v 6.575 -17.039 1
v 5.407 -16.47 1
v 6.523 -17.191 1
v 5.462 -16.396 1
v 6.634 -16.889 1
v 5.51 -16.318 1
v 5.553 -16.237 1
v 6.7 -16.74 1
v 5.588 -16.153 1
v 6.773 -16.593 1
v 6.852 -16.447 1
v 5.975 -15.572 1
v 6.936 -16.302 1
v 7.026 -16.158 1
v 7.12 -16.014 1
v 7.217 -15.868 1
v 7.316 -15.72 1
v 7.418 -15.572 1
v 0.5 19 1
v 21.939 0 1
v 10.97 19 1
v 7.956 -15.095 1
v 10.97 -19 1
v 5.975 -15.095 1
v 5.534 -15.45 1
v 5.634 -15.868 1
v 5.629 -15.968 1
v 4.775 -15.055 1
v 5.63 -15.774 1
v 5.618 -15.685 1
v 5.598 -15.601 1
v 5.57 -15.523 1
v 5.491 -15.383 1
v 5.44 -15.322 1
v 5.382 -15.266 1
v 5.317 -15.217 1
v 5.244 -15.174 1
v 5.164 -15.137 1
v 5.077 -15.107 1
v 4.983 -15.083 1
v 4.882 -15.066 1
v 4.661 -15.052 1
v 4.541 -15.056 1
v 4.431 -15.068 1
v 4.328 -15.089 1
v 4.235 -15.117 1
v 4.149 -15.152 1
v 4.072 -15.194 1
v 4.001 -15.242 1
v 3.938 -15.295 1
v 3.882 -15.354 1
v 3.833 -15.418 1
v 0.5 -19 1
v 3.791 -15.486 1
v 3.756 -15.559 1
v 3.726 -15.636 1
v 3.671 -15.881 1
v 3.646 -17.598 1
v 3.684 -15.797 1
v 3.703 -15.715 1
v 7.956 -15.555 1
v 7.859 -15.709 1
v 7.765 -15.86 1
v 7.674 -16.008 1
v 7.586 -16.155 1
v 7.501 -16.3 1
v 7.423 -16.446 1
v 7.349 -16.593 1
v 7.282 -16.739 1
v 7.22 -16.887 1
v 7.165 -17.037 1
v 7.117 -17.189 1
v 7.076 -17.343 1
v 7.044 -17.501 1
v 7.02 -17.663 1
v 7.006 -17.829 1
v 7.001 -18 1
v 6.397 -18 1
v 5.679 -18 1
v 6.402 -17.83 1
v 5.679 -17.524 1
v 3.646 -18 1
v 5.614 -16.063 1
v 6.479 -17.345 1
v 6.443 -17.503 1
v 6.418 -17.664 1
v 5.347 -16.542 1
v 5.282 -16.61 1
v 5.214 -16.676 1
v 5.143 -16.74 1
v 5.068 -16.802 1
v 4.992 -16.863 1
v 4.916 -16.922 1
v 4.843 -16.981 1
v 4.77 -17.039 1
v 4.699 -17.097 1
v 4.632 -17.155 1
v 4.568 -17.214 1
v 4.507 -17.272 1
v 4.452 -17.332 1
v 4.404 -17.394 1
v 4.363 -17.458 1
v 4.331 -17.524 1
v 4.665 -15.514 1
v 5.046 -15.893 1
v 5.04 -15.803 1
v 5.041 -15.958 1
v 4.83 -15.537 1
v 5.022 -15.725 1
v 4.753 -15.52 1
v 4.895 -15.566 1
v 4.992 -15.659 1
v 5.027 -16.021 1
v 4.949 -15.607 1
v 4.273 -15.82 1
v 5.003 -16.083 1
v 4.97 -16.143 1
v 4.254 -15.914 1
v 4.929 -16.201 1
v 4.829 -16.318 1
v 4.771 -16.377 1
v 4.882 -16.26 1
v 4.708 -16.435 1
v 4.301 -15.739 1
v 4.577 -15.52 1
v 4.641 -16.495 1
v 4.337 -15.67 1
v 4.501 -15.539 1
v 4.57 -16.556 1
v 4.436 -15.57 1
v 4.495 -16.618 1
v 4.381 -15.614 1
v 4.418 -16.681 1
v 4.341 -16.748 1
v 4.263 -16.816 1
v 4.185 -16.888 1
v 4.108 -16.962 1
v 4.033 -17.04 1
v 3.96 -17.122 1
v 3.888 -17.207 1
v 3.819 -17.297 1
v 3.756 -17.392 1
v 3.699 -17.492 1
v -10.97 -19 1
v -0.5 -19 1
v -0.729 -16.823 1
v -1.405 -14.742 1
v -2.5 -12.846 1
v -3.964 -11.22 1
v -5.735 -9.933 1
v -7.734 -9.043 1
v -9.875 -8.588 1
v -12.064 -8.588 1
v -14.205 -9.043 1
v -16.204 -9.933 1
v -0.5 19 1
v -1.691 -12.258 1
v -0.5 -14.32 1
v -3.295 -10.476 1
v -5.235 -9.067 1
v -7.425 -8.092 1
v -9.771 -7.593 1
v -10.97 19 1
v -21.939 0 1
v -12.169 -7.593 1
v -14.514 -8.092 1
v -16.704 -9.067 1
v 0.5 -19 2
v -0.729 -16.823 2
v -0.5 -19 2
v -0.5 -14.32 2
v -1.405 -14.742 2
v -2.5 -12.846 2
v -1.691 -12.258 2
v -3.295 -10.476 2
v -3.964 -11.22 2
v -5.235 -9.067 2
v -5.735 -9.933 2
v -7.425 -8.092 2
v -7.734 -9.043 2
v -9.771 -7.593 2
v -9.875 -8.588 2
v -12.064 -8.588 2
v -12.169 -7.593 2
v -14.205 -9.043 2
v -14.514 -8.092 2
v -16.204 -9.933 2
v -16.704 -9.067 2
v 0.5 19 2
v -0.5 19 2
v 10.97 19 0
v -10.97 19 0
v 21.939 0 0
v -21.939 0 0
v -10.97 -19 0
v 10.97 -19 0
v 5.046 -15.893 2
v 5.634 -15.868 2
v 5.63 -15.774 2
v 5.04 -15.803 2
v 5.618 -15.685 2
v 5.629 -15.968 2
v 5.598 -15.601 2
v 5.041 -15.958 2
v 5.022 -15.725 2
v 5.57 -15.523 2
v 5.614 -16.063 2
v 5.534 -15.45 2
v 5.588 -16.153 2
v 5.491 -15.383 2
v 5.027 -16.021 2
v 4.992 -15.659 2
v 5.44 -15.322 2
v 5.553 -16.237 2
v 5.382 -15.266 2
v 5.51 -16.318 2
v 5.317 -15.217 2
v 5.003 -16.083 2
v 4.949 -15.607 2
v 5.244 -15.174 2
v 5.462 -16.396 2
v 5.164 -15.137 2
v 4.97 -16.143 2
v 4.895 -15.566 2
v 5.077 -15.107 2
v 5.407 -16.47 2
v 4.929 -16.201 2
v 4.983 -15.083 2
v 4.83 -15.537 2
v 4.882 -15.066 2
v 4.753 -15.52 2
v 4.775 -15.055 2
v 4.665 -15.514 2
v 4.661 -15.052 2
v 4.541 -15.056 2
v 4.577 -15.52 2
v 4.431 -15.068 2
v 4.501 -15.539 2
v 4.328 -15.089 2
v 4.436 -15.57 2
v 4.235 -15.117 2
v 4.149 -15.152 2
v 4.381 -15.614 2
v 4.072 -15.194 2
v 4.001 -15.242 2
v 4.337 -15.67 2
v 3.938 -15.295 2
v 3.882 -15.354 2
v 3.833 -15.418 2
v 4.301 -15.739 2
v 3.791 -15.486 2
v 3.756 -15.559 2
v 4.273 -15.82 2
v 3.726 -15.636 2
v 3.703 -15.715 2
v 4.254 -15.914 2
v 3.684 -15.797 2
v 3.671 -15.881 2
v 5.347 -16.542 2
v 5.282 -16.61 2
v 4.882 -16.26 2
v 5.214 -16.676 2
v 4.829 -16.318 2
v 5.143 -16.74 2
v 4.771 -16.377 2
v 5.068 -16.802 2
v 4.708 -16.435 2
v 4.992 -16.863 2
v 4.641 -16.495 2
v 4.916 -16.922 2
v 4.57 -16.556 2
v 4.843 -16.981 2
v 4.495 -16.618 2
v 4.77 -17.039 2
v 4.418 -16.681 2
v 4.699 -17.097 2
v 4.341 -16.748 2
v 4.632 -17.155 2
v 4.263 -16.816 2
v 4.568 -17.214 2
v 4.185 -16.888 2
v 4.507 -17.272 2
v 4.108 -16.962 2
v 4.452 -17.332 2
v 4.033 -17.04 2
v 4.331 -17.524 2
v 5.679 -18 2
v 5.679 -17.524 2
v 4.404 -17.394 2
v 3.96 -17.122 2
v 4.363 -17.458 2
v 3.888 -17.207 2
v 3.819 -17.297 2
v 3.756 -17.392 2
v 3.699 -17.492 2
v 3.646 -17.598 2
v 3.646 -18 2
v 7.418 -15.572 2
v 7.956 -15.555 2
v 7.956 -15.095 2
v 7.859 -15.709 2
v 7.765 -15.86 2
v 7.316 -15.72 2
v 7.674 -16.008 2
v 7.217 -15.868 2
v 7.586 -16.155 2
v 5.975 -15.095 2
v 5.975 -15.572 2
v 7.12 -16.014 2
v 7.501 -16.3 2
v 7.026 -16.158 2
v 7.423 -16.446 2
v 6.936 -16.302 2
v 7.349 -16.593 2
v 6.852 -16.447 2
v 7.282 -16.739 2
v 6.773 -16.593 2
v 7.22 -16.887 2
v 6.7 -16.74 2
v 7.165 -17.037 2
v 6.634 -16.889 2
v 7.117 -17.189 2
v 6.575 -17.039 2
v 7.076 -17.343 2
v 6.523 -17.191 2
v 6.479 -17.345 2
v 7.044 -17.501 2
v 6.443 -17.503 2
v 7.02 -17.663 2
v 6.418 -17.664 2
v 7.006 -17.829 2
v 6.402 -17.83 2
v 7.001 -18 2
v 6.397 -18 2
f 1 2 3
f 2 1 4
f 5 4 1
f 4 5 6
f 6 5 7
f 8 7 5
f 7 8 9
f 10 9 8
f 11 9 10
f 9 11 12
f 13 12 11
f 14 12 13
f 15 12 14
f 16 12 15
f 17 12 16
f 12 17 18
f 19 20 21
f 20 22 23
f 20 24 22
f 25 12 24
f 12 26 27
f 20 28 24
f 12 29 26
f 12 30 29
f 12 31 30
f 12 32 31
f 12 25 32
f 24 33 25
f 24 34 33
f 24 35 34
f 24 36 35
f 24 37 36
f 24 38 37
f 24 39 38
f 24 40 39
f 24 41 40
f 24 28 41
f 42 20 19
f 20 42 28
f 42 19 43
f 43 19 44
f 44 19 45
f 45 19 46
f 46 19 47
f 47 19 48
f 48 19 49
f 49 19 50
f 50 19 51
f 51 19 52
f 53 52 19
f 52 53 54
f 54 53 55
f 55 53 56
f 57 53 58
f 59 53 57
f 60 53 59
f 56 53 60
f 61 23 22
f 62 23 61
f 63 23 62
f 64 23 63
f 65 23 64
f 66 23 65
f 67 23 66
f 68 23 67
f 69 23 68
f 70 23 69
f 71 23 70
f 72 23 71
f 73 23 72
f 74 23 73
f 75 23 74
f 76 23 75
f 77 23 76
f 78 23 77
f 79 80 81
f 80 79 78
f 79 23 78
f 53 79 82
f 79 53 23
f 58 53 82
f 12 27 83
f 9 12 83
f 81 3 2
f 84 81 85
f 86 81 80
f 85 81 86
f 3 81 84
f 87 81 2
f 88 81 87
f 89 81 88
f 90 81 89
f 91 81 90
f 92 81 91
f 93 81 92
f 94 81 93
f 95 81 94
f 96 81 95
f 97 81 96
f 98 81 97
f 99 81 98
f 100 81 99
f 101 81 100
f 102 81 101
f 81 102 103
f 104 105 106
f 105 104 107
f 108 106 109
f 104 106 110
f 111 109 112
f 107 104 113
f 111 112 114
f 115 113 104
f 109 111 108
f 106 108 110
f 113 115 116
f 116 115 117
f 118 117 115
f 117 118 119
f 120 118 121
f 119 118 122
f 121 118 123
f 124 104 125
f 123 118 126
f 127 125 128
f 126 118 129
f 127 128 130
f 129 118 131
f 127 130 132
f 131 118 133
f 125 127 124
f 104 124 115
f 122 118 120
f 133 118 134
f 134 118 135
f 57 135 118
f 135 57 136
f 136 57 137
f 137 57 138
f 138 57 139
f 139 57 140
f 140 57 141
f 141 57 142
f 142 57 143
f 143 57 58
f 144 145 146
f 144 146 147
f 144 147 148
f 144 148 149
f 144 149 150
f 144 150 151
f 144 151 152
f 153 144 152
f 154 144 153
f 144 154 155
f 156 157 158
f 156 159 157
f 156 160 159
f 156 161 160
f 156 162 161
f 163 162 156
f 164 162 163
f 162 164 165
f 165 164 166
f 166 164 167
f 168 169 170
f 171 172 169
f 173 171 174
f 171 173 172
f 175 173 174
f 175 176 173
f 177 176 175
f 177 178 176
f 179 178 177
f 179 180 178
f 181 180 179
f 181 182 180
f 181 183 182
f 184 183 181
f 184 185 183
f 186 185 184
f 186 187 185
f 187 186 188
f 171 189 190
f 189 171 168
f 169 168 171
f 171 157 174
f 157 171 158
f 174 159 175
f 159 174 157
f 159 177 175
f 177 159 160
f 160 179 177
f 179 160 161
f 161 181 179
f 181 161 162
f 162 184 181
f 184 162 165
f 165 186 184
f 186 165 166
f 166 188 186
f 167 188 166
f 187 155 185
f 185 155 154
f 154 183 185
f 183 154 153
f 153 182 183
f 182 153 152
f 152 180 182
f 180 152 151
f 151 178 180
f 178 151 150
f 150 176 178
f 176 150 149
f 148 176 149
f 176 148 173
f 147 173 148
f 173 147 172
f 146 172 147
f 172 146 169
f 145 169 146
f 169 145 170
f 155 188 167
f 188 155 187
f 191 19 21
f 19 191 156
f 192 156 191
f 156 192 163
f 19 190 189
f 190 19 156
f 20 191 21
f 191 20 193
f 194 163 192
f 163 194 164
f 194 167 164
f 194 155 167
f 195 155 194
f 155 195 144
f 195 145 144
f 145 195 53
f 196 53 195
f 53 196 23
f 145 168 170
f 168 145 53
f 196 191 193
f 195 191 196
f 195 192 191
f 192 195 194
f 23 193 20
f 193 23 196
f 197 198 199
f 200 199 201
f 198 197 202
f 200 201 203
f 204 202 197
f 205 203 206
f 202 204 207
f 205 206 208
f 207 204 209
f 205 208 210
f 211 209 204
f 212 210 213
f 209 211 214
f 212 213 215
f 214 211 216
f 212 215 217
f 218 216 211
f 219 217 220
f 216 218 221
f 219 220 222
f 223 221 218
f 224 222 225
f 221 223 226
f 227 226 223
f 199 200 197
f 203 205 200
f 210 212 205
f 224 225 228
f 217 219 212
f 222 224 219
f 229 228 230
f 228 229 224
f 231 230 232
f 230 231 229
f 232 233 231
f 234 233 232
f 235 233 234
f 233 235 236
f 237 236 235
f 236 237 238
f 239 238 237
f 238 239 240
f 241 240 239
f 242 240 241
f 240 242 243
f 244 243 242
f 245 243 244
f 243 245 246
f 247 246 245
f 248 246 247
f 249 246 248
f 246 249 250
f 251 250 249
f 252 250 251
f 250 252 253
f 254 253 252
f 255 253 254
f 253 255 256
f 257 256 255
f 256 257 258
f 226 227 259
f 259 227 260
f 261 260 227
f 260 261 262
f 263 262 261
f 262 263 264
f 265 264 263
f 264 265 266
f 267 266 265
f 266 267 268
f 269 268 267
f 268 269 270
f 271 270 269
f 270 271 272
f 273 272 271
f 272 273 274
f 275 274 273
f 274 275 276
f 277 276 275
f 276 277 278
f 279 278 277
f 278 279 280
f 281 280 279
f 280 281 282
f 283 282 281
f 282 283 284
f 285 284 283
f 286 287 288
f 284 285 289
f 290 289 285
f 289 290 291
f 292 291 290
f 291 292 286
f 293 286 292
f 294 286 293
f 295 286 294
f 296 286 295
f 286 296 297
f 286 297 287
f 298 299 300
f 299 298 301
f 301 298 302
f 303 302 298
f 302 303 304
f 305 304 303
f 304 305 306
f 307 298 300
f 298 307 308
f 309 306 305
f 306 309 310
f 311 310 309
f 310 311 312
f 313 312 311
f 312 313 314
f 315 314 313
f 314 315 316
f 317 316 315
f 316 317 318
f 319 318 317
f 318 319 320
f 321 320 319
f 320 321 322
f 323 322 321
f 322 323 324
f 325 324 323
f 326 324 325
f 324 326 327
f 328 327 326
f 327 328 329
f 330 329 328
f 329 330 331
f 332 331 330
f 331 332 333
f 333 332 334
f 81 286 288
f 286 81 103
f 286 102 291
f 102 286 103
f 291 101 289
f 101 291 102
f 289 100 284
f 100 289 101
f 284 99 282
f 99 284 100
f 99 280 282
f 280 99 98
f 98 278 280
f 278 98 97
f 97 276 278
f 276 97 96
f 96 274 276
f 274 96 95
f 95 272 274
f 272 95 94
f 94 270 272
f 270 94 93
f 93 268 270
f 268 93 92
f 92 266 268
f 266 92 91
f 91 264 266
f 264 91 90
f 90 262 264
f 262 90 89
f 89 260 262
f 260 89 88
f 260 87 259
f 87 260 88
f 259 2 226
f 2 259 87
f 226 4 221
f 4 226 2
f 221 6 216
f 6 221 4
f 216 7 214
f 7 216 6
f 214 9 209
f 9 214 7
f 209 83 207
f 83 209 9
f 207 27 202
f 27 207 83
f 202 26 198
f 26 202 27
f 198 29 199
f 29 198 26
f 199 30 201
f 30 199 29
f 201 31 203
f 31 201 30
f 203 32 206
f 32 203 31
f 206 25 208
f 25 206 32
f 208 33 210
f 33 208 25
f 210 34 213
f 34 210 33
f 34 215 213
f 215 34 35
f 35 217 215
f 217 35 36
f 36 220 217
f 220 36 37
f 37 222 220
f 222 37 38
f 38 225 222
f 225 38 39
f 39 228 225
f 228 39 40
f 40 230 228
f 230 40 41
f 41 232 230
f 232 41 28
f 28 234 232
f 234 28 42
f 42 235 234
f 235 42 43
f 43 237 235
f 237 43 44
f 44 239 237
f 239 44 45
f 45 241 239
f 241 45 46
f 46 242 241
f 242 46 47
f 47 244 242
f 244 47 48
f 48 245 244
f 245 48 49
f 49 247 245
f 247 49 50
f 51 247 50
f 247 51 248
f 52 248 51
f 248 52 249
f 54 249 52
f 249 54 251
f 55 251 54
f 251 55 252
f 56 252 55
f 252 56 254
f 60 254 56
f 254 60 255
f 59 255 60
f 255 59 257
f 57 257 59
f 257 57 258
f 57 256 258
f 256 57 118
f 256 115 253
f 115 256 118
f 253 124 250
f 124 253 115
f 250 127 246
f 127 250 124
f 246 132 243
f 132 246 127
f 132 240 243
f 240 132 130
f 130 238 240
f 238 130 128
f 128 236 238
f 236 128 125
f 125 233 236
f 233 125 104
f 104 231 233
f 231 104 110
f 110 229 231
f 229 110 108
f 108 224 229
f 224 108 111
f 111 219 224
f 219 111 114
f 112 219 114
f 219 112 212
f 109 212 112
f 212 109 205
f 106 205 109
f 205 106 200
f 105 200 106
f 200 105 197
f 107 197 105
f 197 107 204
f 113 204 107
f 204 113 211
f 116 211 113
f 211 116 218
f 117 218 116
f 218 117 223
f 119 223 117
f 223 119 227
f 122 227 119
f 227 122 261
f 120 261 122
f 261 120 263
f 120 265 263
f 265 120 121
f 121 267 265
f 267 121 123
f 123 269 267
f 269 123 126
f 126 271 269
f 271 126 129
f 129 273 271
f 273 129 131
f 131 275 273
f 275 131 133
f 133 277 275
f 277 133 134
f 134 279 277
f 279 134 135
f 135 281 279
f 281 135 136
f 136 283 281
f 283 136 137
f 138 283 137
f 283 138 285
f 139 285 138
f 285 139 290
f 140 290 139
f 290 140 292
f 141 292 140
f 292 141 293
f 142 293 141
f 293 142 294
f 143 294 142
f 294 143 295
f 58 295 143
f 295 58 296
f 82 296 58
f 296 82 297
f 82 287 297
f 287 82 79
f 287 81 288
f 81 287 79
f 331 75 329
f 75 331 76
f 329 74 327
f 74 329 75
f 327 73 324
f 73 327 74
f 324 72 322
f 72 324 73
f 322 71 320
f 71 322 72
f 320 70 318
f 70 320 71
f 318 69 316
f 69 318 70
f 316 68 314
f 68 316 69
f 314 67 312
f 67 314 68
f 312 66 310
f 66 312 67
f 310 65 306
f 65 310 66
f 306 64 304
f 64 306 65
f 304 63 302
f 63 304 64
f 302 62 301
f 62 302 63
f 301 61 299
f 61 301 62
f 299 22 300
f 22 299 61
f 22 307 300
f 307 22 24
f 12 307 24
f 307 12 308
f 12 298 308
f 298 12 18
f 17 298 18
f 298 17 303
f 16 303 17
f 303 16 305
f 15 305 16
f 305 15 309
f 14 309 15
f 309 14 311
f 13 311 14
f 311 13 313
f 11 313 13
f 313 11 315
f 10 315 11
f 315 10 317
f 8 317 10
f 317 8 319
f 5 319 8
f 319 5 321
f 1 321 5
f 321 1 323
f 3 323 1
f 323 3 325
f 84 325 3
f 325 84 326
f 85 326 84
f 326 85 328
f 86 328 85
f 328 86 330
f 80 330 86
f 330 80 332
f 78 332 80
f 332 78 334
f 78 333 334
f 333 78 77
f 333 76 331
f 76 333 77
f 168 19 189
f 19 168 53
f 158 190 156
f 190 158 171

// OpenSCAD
include <../Scripts/18xx tiles basic functions.scad>
hex("Green");
put_tilenr("27");
sharp_curve(r=5);
straight_line();
